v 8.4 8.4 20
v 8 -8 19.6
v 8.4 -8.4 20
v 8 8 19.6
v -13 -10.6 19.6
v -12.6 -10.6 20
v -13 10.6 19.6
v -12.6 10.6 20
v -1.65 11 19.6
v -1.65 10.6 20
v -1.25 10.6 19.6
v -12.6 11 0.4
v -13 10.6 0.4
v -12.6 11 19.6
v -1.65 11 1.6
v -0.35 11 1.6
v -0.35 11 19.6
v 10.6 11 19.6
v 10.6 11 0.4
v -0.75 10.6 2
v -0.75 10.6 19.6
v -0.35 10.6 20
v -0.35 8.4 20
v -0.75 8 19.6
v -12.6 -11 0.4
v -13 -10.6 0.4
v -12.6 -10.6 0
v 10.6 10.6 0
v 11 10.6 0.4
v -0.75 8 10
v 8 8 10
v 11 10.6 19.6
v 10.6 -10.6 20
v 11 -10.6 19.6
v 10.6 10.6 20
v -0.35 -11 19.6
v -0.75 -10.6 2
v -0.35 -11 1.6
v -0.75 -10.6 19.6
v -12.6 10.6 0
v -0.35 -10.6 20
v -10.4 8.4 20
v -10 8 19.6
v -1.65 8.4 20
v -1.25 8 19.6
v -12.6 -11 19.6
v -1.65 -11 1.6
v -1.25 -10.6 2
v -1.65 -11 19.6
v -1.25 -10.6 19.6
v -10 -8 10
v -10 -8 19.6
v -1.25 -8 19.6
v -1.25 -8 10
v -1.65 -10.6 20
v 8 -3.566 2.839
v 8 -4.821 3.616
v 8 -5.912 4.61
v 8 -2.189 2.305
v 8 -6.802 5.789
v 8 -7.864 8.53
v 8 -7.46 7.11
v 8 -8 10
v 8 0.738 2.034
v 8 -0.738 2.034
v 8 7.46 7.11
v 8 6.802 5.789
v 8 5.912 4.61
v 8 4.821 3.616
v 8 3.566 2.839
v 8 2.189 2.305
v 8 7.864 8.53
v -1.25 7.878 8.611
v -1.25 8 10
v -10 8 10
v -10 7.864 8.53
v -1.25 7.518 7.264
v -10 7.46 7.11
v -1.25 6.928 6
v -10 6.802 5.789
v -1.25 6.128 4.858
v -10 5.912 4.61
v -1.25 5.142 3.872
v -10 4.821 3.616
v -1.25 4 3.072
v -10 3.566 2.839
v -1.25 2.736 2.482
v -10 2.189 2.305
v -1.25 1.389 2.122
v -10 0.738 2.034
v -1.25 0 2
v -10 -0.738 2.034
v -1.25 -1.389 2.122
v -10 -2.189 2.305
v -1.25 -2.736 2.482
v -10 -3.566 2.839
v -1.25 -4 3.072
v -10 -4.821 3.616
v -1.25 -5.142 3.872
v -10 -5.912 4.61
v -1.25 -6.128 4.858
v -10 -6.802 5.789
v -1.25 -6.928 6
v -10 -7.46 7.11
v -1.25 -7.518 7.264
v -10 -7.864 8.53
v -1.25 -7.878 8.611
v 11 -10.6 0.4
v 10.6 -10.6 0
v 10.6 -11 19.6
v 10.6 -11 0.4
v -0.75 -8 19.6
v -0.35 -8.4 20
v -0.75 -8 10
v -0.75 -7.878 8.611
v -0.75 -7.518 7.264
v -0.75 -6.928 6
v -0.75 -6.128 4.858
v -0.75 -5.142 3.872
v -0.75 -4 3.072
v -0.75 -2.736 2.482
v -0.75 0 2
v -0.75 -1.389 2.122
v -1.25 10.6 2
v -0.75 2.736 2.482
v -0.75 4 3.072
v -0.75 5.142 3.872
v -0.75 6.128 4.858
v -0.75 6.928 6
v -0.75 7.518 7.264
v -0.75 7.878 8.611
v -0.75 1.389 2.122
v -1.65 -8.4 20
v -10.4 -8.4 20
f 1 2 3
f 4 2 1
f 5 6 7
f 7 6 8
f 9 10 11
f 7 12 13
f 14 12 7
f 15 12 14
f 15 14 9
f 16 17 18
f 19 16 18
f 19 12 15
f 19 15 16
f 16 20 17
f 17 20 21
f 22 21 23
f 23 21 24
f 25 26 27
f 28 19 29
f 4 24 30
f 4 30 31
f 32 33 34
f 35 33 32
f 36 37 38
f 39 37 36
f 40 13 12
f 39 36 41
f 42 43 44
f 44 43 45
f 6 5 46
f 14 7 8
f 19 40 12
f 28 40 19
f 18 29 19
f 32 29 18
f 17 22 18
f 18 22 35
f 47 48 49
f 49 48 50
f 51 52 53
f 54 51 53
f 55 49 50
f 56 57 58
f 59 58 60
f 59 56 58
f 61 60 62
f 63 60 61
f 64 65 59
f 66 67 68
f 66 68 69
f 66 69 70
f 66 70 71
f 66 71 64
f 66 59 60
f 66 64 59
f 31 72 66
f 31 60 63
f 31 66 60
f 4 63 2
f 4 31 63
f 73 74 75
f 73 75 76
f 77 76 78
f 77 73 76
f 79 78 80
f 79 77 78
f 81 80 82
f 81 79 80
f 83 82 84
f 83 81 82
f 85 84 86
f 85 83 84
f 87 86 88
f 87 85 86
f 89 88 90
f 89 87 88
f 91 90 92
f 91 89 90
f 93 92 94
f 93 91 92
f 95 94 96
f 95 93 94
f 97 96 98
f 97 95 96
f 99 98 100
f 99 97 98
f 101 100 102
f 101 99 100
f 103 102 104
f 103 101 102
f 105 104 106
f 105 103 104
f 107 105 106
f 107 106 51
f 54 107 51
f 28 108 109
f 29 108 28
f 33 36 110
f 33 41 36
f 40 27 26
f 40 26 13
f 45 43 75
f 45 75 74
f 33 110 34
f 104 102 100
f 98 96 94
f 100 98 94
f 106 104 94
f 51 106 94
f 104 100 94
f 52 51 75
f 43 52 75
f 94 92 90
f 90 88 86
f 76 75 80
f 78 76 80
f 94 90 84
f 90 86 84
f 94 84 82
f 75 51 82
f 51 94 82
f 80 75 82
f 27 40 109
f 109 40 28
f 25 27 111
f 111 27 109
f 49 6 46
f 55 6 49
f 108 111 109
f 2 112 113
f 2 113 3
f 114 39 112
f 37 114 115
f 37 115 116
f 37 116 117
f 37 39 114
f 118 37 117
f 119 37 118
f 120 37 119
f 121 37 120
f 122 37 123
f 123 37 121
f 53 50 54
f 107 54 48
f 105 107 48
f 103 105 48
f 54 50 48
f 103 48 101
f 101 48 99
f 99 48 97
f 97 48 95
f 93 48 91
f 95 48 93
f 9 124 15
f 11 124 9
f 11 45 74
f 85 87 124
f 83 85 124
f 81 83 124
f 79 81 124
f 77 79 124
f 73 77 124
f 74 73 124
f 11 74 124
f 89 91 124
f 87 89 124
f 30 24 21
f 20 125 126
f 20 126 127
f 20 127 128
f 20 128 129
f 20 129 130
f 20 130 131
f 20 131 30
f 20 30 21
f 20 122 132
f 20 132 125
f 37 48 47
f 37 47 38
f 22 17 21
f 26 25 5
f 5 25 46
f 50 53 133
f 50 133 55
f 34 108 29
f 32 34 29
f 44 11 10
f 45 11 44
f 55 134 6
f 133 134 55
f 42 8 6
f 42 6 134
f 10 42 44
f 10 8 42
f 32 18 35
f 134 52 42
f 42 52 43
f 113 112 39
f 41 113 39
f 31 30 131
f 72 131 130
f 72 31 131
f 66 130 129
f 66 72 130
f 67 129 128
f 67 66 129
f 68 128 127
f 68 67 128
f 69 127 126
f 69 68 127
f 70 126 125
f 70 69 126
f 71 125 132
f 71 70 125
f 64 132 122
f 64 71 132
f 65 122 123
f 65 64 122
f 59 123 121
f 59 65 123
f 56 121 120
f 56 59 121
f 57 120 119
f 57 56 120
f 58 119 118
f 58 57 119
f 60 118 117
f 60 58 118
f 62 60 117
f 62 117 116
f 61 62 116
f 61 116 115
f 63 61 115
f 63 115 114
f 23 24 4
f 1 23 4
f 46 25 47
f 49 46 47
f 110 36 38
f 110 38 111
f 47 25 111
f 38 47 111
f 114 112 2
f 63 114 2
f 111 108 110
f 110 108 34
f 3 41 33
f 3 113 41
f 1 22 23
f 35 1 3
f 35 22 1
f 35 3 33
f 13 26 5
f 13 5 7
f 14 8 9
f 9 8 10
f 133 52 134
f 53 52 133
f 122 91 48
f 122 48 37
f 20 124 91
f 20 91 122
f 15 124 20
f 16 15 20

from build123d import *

# Parameters (mm, degrees)
BOX002_W       = 0.5
BOX002_H       = 26
BOX002_DEPTH   = 24
CYLINDER_R     = 8
CYLINDER_DEPTH = 18
BOX001_W       = 18
BOX001_H       = 16
BOX001_DEPTH   = 10
BOX_W          = 24
BOX_H          = 22
BOX_DEPTH      = 20
CHAMFER_SIZE   = 0.4


with BuildPart() as cube002:
    # Box002 → Box002 (new body)
    with BuildSketch(Plane(origin=(-1.25, -13, 2), x_dir=(1, 0, 0), z_dir=(0, 0, 1))):
        with Locations((0.25, 13)):
            Rectangle(BOX002_W, BOX002_H)
    extrude(amount=BOX002_DEPTH)


with BuildPart() as cylinder:
    # Cylinder → Cylinder (new body)
    with BuildSketch(Plane(origin=(8, 0, 10), x_dir=(0, 0, 1), z_dir=(-1, 0, 0))):
        Circle(CYLINDER_R)
    extrude(amount=CYLINDER_DEPTH)


with BuildPart() as fusion:
    # Box001 → Box001 (new body)
    with BuildSketch(Plane(origin=(-10, -8, 10), x_dir=(1, 0, 0), z_dir=(0, 0, 1))):
        with Locations((9, 8)):
            Rectangle(BOX001_W, BOX001_H)
    extrude(amount=BOX001_DEPTH)

    # Fusion: union Cylinder
    add(cylinder.part)


with BuildPart() as chamfer_body:
    # Box → Box (new body)
    with BuildSketch(Plane(origin=(-13, -11, 0), x_dir=(1, 0, 0), z_dir=(0, 0, 1))):
        with Locations((12, 11)):
            Rectangle(BOX_W, BOX_H)
    extrude(amount=BOX_DEPTH)

    # Cut: cut Fusion
    add(fusion.part, mode=Mode.SUBTRACT)

    # Cut001: cut Cube002
    add(cube002.part, mode=Mode.SUBTRACT)

    # Chamfer
    chamfer_edges = [chamfer_body.edges().sort_by_distance(p)[0] for p in [
        (-13, -11, 10),
        (-13, 0, 20),
        (-13, 11, 10),
        (-13, 0, 0),
        (11, -11, 10),
        (5.125, -11, 20),
        (-0.75, -11, 11),
        (-1, -11, 2),
        (-1.25, -11, 11),
        (-7.125, -11, 20),
        (-1, -11, 0),
        (-7.125, 11, 20),
        (-1.25, 9.5, 20),
        (-5.625, 8, 20),
        (-10, 0, 20),
        (-5.625, -8, 20),
        (-1.25, -9.5, 20),
        (11, 11, 10),
        (5.125, 11, 20),
        (-0.75, 11, 11),
        (-1, 11, 2),
        (-1.25, 11, 11),
        (-1, 11, 0),
        (11, 0, 0),
        (11, 0, 20),
        (-0.75, -9.5, 20),
        (3.625, -8, 20),
        (8, 0, 20),
        (3.625, 8, 20),
        (-0.75, 9.5, 20),
    ]]
    chamfer(chamfer_edges, length=CHAMFER_SIZE)


solid = chamfer_body.part
